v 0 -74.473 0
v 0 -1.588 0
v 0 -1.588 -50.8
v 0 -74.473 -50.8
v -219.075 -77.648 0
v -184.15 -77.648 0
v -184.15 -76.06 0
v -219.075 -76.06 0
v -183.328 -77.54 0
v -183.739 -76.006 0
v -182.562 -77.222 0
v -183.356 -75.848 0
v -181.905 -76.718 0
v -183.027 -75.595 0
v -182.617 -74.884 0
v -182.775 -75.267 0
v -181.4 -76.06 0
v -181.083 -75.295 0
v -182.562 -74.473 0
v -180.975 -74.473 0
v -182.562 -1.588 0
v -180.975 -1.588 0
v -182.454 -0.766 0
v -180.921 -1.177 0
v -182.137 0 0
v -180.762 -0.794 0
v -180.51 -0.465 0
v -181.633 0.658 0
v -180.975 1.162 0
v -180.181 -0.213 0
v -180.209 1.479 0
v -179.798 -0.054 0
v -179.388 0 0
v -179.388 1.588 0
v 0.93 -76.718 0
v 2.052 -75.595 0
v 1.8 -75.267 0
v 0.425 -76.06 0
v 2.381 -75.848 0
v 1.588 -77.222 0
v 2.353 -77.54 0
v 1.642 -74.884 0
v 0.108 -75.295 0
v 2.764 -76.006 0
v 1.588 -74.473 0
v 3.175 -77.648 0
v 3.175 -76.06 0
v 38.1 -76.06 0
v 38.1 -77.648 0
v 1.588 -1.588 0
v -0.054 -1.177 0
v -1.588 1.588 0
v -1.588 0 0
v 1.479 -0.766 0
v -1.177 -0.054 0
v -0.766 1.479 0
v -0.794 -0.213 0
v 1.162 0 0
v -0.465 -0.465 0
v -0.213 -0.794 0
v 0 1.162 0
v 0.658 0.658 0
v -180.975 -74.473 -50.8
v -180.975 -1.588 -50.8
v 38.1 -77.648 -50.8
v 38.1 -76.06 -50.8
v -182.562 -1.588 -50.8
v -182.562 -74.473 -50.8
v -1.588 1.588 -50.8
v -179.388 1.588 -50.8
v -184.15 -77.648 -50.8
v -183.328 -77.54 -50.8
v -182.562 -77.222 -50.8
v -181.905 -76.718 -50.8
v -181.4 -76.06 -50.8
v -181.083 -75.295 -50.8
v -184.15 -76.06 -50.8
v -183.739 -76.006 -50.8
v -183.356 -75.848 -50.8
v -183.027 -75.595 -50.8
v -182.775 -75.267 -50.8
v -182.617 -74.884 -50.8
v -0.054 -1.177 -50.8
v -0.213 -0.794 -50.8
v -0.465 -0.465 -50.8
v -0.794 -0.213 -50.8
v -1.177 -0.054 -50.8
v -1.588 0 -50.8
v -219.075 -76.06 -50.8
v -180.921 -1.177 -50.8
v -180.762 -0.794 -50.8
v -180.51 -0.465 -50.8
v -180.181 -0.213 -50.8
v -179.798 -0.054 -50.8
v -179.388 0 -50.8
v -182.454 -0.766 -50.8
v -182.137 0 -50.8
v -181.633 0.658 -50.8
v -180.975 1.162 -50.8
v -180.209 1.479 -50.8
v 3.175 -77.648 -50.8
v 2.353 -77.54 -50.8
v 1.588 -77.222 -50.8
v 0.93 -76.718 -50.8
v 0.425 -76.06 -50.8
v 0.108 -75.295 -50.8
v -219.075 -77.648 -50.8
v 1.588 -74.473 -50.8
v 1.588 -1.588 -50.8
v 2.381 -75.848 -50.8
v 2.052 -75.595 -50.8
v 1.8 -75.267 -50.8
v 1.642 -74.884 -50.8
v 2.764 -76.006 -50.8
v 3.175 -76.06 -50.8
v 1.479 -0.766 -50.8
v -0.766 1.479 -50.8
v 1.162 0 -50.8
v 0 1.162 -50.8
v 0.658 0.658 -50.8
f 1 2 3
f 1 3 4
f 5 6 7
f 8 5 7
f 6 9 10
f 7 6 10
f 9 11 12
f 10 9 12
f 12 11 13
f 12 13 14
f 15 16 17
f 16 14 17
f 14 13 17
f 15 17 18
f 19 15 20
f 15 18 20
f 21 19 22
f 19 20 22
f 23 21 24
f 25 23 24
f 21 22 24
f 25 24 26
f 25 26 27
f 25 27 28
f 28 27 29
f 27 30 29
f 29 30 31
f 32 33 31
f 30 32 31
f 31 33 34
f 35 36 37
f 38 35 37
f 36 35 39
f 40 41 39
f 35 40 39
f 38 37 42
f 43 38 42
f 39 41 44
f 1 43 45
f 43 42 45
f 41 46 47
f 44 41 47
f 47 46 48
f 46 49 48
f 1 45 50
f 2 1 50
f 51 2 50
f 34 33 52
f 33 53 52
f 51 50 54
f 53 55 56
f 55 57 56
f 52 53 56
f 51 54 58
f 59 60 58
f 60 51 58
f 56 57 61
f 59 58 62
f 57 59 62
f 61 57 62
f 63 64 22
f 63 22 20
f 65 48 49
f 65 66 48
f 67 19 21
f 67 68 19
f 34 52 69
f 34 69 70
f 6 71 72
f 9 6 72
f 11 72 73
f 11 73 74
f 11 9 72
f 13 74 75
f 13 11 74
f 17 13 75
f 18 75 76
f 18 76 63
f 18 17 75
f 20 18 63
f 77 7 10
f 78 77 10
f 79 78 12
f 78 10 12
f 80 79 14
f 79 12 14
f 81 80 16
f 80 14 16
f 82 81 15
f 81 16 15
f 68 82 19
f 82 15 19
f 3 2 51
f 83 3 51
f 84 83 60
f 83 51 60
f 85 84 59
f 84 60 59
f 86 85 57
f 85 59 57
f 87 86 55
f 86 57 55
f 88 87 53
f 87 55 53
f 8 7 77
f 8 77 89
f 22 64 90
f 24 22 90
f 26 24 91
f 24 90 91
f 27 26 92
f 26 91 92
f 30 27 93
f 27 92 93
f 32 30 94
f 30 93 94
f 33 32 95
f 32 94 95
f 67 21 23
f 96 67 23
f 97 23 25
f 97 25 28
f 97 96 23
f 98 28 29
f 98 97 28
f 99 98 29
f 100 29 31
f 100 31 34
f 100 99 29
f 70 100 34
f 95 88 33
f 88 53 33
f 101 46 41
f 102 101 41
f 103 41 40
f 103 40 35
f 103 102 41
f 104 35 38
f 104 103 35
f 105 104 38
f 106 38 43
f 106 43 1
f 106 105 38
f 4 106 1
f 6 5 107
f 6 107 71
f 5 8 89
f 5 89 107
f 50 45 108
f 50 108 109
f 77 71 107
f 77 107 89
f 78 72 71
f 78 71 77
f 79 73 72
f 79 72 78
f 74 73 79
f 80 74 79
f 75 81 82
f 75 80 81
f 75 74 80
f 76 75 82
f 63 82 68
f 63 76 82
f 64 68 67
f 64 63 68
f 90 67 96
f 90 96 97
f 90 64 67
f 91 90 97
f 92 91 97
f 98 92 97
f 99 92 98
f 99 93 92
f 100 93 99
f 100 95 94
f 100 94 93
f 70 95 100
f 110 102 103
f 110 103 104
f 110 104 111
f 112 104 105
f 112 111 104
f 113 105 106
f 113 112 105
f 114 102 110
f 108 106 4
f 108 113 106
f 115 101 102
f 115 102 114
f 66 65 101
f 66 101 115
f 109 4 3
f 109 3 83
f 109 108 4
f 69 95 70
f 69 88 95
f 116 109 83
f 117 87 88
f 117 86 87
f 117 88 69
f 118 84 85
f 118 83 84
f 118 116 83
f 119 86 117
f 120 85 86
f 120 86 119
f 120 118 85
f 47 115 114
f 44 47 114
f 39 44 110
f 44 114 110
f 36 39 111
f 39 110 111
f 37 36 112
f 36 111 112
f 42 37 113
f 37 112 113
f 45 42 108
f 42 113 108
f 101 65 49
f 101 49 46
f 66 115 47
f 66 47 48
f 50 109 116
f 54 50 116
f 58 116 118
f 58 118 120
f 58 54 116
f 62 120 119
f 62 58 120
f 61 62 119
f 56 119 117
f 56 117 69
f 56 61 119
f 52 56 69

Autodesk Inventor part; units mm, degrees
ref_plane "YZ Plane" through (0, 0, 0) normal (1, 0, 0) x (0, 1, 0)
ref_plane "XZ Plane" through (0, 0, 0) normal (0, 1, 0) x (-1, 0, 0)
ref_plane "XY Plane" through (0, 0, 0) normal (0, 0, 1) x (1, 0, 0)
sketch "Sketch1" plane through (0, 0, 0) normal (0, 1, 0) x (-1, 0, 0)
  line L0 (0, 0) -> (180.975, 0)
  line L1 (180.975, 0) -> (180.975, -50.8)
  line L2 (180.975, -50.8) -> (0, -50.8)
  line L3 (0, -50.8) -> (0, 0)
  dimension "d0" = 180.975
  dimension "d1" = 50.8
extrude "Plate1" add sketch "Sketch1" along normal blind 1.5875
sketch "Sketch2" plane through (0, 0, 0) normal (1, 0, 0) x (0, 1, 0)
  line L0 (0, -50.8) -> (0, 0)
  line L1 (0, 0) -> (-76.0603, 0)
  line L2 (-76.0603, 0) -> (-76.0603, -50.8)
  line L3 (-76.0603, -50.8) -> (0, -50.8)
edge flange "Flange1" height 77.6478 angle 90 thickness 1.5875 bend radius 1.5875 thickness toward (1, 0, 0) relief straight relief width 1.5875 relief depth 0.7937 corner gap 1.5875 corner form 0 edges at (0, 0, -25.4) (-180.975, 0, -25.4) wall of the first edge with corners at (0, 0, -50.8) (0, 0, 0) (0, -76.0603, 0) (0, -76.0603, -50.8)
bend "Bend1"
corner "Corner1"
sketch "Sketch3" plane through (1.5875, -76.0603, -50.8) normal (0, -1, 0) x (1, 0, 0)
  line L0 (0, 50.8) -> (0, 0)
  line L1 (0, 0) -> (36.5125, 0)
  line L2 (36.5125, 0) -> (36.5125, 50.8)
  line L3 (36.5125, 50.8) -> (0, 50.8)
edge flange "Flange2" height 38.1 angle 90 thickness 1.5875 bend radius 1.5875 thickness toward (0, -1, 0) relief straight relief width 1.5875 relief depth 0.7937 corner gap 1.5875 corner form 0 edges at (1.5875, -76.0603, -25.4) (-182.5625, -76.0603, -25.4) wall of the first edge with corners at (1.5875, -76.0603, 0) (1.5875, -76.0603, -50.8) (38.1, -76.0603, -50.8) (38.1, -76.0603, 0)
bend "Bend2"
corner "Corner2"
equation "\"d3\" = BendReliefWidth"
equation "\"d4\" = BendReliefDepth"
equation "\"d5\" = MinimumRemnant"
equation "\"d6\" = BendRadius"
equation "\"d9\" = BendRadius"
equation "\"d10\" = CornerReliefSize"
equation "\"d11\" = GapSize"
equation "\"d12\" = JacobiRadiusSize"
equation "\"d13\" = BendReliefWidth"
equation "\"d14\" = BendReliefDepth"
equation "\"d15\" = MinimumRemnant"
equation "\"d16\" = BendRadius"
equation "\"d19\" = BendRadius"
equation "\"d20\" = CornerReliefSize"
equation "\"d21\" = GapSize"
equation "\"d22\" = JacobiRadiusSize"
equation "\"BendRadius\" = Thickness"
equation "\"BendReliefWidth\" = Thickness"
equation "\"BendReliefDepth\" = 0.5 * Thickness"
equation "\"CornerReliefSize\" = 4 * Thickness"
equation "\"MinimumRemnant\" = 2 * Thickness"
equation "\"TransitionRadius\" = BendRadius"
equation "\"JacobiRadiusSize\" = Thickness"
equation "\"GapSize\" = Thickness"
equation "\"d2\" = BendRadius"
equation "\"Thickness\" = 1.5875"
properties part number "batteryHolder"
